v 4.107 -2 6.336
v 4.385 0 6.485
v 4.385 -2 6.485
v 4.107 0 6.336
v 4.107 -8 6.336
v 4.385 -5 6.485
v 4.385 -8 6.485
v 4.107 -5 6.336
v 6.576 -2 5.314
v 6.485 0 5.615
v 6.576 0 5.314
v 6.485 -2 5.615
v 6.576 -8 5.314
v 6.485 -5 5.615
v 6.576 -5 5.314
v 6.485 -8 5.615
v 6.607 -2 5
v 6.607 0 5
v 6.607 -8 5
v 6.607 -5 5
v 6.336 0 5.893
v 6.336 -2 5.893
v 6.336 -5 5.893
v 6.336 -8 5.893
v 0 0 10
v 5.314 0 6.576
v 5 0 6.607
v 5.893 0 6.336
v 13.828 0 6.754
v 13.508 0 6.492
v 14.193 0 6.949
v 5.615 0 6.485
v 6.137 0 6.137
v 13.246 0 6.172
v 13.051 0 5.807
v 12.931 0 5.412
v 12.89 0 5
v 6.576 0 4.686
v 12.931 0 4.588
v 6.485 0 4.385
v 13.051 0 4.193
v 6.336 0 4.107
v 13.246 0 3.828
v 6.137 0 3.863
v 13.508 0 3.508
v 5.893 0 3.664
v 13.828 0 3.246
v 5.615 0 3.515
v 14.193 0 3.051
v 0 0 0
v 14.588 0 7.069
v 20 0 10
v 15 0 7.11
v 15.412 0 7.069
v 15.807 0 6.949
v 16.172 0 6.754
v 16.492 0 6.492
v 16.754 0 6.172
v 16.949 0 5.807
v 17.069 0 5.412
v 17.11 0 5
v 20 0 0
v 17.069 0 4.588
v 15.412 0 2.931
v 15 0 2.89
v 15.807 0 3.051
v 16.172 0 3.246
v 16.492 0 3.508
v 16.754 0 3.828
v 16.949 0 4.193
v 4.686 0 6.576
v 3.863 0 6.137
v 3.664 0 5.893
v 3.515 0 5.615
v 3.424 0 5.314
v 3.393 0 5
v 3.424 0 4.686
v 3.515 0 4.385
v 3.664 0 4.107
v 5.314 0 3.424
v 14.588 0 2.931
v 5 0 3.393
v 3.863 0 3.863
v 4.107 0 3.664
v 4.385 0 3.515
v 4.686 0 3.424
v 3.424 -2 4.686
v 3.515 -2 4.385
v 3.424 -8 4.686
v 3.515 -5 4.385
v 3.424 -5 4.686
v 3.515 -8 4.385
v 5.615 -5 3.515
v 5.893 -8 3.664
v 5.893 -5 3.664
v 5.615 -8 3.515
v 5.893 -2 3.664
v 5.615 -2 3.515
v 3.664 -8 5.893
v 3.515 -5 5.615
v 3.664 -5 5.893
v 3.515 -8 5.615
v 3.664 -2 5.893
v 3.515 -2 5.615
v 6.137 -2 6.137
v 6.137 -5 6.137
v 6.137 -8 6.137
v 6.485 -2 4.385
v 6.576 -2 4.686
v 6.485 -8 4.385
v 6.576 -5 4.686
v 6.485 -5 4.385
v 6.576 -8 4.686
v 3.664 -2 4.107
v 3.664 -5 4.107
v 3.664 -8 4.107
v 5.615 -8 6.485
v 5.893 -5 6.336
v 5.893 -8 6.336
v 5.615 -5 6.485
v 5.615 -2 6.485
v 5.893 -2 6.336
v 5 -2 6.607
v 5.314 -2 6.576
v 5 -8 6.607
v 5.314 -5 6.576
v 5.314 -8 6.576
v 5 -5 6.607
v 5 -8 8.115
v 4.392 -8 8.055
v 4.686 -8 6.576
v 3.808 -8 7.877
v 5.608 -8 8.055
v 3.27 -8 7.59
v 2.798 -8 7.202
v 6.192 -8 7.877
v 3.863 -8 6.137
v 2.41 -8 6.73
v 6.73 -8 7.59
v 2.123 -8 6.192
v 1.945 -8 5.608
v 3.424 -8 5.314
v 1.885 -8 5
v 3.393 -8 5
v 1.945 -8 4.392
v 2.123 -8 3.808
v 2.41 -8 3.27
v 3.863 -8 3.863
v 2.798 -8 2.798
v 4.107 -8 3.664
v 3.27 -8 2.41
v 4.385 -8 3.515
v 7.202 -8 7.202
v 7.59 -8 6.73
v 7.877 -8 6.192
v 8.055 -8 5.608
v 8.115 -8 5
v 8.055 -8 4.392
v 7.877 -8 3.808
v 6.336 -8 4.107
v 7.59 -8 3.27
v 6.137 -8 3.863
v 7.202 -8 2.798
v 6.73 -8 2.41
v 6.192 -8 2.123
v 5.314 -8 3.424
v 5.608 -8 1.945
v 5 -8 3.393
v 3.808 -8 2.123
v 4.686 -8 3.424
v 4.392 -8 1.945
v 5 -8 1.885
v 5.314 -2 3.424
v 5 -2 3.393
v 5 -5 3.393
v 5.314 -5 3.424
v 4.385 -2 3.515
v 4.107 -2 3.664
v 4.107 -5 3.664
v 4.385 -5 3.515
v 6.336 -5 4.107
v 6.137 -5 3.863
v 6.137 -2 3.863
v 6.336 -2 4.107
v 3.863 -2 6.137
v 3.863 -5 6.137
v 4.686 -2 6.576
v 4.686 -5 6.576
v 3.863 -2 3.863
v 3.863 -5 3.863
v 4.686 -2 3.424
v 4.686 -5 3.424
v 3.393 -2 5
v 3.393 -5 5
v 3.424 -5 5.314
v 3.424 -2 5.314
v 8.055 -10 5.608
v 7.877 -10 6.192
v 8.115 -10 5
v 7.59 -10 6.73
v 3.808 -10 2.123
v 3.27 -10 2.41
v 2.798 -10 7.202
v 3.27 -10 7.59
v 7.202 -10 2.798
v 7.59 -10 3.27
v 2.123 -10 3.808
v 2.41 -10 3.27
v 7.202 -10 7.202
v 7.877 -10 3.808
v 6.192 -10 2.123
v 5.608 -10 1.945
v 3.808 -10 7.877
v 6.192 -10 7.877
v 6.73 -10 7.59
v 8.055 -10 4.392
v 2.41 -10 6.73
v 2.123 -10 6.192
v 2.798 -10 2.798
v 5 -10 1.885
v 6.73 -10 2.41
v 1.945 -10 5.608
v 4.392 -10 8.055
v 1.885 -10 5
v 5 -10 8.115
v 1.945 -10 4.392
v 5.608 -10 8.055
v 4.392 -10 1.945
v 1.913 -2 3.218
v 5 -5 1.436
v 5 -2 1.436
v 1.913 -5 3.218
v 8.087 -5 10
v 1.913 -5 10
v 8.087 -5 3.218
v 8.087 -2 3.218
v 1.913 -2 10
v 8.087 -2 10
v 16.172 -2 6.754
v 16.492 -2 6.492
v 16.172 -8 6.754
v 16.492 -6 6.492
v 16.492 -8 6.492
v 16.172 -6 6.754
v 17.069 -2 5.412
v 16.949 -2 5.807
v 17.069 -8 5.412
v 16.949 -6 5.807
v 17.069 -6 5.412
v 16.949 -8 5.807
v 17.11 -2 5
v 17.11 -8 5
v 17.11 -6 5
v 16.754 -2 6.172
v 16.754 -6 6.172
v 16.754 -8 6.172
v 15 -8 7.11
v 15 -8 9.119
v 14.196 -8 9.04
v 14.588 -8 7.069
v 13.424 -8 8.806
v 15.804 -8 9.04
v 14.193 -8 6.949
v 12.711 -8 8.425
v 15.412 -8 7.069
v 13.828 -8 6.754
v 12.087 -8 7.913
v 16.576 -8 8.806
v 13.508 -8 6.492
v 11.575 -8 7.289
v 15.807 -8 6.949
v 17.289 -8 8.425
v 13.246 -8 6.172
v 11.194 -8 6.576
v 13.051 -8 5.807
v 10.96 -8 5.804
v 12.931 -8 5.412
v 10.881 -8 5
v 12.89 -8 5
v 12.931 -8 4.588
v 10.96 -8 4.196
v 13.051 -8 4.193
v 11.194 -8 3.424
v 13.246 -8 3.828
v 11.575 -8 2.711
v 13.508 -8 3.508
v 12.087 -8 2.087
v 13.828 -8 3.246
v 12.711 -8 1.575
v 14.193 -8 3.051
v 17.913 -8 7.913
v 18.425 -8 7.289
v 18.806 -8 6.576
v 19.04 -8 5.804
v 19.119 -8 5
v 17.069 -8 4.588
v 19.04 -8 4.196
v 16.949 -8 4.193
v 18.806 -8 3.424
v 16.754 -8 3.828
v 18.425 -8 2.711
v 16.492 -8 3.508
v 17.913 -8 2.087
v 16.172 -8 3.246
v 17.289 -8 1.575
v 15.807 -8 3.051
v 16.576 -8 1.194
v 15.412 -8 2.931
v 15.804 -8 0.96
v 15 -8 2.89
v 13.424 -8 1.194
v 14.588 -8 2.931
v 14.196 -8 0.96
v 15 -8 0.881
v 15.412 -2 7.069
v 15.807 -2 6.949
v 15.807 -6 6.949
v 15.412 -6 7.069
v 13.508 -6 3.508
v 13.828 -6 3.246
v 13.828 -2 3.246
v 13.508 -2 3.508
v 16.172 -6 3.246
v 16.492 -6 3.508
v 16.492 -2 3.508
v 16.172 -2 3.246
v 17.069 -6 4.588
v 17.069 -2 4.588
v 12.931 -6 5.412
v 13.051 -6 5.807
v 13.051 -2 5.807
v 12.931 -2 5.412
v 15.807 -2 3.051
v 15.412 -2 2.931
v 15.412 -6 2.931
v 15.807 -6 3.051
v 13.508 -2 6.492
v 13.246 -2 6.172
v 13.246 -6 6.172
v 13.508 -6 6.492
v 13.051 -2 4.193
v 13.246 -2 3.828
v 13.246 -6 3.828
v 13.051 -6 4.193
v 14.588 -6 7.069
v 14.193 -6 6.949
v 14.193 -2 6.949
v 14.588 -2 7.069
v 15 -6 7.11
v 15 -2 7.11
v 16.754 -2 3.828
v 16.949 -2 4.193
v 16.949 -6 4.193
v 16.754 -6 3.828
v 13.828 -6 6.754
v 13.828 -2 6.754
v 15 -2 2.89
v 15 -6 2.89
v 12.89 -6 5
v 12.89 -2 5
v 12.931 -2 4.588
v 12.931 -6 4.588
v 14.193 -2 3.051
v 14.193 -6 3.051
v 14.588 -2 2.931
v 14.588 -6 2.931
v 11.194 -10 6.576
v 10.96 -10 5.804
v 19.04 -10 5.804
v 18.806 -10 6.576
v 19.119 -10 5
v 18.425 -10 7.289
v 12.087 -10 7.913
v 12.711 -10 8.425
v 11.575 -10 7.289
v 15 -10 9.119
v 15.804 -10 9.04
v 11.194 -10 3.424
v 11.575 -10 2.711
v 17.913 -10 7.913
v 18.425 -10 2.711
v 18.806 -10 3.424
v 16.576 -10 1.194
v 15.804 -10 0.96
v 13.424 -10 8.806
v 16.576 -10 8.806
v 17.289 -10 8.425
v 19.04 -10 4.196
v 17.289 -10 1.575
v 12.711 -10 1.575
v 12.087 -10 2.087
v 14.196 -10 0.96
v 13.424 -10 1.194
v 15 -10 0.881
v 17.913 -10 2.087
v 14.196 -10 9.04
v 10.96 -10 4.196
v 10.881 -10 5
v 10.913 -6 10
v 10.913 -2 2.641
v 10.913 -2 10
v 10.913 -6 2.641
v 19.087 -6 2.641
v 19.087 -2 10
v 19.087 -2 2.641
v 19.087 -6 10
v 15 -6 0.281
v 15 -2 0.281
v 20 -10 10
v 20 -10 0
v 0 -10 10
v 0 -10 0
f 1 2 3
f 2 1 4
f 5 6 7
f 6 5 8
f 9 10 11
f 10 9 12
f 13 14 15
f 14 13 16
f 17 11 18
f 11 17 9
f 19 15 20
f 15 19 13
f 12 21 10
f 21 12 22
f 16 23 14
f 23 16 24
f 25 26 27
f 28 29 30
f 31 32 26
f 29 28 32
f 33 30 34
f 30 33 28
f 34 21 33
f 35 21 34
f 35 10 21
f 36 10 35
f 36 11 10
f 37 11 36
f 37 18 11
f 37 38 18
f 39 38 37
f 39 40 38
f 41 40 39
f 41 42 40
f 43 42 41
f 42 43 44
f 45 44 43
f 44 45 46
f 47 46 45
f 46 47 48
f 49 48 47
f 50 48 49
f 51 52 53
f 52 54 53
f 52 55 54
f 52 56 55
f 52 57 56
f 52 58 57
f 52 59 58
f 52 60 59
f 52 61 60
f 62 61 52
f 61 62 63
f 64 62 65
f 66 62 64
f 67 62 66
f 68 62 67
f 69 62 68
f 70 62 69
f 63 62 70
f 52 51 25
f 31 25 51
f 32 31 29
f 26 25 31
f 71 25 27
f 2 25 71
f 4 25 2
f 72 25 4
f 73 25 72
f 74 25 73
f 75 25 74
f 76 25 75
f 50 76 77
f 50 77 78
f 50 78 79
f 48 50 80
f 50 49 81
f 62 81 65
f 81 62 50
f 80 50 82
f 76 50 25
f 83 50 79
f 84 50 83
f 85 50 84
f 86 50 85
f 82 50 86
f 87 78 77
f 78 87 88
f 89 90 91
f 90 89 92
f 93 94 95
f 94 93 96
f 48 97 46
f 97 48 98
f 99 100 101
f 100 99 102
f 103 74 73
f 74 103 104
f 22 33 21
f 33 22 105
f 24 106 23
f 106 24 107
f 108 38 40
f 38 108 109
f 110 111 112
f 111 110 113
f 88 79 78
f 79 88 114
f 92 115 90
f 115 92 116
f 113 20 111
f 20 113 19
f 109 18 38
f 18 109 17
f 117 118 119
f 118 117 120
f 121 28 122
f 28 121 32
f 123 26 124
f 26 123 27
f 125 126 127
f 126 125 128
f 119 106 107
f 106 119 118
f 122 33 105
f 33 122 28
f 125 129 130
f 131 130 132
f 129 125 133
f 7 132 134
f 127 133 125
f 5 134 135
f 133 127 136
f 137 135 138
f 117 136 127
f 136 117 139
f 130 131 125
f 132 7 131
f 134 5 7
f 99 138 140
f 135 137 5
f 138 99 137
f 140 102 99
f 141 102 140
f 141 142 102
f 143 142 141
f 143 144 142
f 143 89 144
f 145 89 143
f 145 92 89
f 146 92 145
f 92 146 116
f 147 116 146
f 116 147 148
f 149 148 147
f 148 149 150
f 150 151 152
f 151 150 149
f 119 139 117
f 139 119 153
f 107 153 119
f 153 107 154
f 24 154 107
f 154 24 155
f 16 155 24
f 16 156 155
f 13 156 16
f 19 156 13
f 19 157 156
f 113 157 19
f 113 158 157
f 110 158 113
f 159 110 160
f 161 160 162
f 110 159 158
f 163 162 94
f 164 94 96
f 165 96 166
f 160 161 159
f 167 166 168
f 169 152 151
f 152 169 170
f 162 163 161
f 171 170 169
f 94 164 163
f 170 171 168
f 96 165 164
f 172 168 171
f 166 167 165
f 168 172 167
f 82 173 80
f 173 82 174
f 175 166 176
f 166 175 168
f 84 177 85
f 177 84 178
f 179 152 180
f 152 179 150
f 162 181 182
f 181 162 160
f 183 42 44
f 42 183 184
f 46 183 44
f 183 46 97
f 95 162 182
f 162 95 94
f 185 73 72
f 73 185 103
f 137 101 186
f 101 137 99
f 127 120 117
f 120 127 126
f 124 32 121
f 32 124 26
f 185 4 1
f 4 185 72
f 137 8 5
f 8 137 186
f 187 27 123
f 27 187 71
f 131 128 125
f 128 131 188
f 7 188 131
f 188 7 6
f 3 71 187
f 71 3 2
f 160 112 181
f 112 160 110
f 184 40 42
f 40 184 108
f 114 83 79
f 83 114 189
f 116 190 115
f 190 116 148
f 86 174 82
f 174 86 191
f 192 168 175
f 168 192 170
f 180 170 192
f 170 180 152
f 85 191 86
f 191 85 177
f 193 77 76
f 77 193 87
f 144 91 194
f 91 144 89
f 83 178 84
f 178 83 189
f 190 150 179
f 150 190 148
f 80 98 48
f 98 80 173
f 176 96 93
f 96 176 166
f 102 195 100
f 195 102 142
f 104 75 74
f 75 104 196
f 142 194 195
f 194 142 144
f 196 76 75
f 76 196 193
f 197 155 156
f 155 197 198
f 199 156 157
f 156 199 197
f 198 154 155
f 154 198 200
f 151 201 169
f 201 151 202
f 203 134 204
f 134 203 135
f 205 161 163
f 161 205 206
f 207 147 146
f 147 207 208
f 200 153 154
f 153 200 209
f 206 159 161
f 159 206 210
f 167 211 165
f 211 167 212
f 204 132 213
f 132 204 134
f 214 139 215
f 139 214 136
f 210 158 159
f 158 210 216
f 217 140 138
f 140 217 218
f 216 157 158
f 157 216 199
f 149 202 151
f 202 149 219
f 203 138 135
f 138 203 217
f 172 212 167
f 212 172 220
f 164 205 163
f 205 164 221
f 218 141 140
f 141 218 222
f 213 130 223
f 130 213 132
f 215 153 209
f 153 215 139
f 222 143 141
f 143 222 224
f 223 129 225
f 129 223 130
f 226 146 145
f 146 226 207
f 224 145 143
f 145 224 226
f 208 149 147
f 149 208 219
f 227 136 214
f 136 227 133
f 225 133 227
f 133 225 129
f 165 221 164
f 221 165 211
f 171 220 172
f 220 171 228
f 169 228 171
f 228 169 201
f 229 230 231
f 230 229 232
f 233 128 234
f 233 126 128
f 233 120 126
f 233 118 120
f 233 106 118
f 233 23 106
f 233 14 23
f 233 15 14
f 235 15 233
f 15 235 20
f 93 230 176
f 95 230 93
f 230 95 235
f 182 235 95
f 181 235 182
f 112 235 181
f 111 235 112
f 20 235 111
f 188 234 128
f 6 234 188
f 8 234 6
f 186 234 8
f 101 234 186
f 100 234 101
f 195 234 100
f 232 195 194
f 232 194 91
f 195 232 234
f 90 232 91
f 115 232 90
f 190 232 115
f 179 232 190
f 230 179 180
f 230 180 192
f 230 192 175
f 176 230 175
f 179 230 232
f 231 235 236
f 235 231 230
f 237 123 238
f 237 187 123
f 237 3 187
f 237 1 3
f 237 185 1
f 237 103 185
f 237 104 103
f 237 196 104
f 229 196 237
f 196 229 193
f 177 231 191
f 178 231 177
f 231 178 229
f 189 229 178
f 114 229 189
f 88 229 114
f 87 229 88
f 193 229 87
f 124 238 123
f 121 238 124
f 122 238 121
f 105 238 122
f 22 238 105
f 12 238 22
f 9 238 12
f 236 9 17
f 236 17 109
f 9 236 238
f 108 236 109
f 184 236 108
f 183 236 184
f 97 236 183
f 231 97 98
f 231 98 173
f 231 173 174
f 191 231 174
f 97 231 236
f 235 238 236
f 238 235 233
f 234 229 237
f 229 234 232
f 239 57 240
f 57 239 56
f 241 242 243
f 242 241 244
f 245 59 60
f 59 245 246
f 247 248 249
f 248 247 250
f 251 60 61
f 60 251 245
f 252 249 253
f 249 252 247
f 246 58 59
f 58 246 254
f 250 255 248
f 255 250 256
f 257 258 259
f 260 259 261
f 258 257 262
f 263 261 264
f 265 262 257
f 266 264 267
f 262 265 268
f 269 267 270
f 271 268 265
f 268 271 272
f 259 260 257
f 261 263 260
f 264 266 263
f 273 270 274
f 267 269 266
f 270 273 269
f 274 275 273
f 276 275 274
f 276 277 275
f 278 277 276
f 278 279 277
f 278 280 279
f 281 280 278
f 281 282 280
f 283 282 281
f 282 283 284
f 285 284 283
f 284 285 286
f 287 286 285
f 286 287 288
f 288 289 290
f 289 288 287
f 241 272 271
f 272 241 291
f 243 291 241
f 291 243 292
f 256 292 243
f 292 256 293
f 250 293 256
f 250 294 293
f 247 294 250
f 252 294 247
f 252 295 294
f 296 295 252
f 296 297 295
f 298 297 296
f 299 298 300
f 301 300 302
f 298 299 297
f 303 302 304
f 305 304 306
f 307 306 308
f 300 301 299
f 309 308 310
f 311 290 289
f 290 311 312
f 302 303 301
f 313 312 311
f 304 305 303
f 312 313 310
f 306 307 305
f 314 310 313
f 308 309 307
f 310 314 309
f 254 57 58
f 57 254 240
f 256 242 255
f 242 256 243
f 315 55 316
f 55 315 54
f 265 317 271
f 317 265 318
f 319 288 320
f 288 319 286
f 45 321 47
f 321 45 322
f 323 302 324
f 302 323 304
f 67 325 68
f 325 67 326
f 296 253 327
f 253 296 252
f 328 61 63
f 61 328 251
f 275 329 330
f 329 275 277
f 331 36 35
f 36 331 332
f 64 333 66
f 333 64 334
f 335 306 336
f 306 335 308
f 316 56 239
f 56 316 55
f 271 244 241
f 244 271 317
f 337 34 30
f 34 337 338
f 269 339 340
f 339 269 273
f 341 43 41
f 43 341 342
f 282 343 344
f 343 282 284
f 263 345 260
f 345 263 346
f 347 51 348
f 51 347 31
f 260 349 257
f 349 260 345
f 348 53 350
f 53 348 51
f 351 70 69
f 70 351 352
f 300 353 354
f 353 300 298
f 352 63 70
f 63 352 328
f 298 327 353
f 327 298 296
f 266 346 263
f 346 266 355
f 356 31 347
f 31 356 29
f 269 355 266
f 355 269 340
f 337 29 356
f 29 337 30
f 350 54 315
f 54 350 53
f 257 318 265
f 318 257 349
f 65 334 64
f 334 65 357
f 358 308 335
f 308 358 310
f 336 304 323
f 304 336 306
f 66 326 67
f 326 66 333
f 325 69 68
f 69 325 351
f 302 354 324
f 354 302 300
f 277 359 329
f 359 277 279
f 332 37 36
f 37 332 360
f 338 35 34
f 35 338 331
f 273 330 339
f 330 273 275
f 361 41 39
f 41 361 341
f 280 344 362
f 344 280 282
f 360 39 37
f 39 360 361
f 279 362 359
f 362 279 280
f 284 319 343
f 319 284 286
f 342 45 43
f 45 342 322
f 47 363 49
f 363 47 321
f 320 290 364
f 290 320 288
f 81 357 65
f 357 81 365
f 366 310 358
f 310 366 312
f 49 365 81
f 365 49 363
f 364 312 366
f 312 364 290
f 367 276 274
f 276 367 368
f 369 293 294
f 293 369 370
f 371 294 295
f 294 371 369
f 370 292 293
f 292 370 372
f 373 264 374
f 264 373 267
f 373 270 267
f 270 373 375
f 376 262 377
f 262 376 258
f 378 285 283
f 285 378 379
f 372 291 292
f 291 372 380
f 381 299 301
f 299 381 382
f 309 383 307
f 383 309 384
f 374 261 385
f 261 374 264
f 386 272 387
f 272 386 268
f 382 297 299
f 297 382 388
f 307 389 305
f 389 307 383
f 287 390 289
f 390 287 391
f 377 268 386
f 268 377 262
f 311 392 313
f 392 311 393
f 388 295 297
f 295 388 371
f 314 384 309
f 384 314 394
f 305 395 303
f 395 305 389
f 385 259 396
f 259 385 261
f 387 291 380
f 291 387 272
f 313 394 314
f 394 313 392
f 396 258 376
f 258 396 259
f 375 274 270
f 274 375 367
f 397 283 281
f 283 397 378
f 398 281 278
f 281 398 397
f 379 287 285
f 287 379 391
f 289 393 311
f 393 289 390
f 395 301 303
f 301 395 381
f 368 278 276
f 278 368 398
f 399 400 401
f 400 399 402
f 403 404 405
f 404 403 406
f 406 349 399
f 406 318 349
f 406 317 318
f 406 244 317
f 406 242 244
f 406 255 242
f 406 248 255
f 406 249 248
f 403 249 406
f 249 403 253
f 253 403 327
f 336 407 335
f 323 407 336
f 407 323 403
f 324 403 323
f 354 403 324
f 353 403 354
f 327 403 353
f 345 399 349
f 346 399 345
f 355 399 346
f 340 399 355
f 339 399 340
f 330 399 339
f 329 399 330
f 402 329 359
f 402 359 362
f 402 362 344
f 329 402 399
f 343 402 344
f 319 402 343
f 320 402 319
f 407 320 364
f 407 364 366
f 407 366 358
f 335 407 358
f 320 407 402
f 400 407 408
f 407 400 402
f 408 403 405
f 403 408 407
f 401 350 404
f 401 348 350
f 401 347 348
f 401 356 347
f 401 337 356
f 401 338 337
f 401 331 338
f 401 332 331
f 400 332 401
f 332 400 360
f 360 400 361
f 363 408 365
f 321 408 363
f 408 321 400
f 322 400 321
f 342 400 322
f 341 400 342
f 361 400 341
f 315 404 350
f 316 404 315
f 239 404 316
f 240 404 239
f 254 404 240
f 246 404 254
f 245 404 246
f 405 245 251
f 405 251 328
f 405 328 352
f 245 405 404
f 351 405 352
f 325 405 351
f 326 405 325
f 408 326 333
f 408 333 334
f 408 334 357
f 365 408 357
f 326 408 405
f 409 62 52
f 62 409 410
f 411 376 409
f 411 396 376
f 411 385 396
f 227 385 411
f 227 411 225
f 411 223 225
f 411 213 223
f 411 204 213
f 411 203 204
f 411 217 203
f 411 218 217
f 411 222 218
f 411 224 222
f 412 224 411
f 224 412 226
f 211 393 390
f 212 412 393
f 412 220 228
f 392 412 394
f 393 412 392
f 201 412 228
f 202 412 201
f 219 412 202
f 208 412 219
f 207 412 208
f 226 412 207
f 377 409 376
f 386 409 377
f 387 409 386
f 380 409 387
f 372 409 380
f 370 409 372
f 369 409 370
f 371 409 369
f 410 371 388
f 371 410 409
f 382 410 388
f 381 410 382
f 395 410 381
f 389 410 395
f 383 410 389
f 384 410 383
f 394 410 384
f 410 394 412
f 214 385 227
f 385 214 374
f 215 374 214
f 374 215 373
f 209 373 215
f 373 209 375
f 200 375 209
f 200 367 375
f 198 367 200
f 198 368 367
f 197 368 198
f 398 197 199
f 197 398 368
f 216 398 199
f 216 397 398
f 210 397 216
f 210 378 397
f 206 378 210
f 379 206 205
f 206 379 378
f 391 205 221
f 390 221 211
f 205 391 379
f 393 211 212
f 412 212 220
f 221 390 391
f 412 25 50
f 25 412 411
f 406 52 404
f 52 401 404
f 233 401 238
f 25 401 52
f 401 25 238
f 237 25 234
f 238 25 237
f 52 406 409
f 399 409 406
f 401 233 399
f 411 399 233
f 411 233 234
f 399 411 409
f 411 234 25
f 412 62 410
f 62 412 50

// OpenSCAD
// file: bolts.scad
$radial_error = 0.1;

module cylinder_outer(height, radius, fn = 32) {
	fudge = 1/cos(180/fn);
	cylinder(h=height,r=radius*fudge+$radial_error, $fn=fn);
}

module cylinder_inner(height, radius, fn = 32) {
	cylinder(h=height,r=radius-$radial_error,$fn=fn);
}

// Make a hole for a bolt/screw combination.
module bolt(diameter=3, depth=8, nut_offset=2, shaft_length=10, inset=10) {
	hole(diameter, depth, inset);
	hull() {
		shaft_width = diameter;
		translate([0, 0, nut_offset]) rotate(360/12, [0, 0, 1]) cylinder_outer(diameter, shaft_width, 6);
		translate([0, shaft_length, nut_offset]) rotate(360/12, [0, 0, 1]) cylinder_outer(diameter, shaft_width, 6);
	}
}

// Make a hole. The diameter is the size of the screw (e.g. 3 for M3). Depth is how far the hole should go for the thread, and inset is how far out there should be a hole for the head to go.
module hole(diameter=3, depth=6, inset=10) {
	cylinder_outer(depth, diameter/2);
	translate([0, 0, depth]) cylinder_outer(inset, diameter, 32);
}
// main file
include <bolts.scad>;

rotate(90, [1, 0, 0]) difference() {
	cube([20, 10, 10]);
	translate([5, 5, 0]) bolt(diameter=3, depth=8);
	translate([15, 5, 0]) bolt(diameter=4, depth=8);
}
